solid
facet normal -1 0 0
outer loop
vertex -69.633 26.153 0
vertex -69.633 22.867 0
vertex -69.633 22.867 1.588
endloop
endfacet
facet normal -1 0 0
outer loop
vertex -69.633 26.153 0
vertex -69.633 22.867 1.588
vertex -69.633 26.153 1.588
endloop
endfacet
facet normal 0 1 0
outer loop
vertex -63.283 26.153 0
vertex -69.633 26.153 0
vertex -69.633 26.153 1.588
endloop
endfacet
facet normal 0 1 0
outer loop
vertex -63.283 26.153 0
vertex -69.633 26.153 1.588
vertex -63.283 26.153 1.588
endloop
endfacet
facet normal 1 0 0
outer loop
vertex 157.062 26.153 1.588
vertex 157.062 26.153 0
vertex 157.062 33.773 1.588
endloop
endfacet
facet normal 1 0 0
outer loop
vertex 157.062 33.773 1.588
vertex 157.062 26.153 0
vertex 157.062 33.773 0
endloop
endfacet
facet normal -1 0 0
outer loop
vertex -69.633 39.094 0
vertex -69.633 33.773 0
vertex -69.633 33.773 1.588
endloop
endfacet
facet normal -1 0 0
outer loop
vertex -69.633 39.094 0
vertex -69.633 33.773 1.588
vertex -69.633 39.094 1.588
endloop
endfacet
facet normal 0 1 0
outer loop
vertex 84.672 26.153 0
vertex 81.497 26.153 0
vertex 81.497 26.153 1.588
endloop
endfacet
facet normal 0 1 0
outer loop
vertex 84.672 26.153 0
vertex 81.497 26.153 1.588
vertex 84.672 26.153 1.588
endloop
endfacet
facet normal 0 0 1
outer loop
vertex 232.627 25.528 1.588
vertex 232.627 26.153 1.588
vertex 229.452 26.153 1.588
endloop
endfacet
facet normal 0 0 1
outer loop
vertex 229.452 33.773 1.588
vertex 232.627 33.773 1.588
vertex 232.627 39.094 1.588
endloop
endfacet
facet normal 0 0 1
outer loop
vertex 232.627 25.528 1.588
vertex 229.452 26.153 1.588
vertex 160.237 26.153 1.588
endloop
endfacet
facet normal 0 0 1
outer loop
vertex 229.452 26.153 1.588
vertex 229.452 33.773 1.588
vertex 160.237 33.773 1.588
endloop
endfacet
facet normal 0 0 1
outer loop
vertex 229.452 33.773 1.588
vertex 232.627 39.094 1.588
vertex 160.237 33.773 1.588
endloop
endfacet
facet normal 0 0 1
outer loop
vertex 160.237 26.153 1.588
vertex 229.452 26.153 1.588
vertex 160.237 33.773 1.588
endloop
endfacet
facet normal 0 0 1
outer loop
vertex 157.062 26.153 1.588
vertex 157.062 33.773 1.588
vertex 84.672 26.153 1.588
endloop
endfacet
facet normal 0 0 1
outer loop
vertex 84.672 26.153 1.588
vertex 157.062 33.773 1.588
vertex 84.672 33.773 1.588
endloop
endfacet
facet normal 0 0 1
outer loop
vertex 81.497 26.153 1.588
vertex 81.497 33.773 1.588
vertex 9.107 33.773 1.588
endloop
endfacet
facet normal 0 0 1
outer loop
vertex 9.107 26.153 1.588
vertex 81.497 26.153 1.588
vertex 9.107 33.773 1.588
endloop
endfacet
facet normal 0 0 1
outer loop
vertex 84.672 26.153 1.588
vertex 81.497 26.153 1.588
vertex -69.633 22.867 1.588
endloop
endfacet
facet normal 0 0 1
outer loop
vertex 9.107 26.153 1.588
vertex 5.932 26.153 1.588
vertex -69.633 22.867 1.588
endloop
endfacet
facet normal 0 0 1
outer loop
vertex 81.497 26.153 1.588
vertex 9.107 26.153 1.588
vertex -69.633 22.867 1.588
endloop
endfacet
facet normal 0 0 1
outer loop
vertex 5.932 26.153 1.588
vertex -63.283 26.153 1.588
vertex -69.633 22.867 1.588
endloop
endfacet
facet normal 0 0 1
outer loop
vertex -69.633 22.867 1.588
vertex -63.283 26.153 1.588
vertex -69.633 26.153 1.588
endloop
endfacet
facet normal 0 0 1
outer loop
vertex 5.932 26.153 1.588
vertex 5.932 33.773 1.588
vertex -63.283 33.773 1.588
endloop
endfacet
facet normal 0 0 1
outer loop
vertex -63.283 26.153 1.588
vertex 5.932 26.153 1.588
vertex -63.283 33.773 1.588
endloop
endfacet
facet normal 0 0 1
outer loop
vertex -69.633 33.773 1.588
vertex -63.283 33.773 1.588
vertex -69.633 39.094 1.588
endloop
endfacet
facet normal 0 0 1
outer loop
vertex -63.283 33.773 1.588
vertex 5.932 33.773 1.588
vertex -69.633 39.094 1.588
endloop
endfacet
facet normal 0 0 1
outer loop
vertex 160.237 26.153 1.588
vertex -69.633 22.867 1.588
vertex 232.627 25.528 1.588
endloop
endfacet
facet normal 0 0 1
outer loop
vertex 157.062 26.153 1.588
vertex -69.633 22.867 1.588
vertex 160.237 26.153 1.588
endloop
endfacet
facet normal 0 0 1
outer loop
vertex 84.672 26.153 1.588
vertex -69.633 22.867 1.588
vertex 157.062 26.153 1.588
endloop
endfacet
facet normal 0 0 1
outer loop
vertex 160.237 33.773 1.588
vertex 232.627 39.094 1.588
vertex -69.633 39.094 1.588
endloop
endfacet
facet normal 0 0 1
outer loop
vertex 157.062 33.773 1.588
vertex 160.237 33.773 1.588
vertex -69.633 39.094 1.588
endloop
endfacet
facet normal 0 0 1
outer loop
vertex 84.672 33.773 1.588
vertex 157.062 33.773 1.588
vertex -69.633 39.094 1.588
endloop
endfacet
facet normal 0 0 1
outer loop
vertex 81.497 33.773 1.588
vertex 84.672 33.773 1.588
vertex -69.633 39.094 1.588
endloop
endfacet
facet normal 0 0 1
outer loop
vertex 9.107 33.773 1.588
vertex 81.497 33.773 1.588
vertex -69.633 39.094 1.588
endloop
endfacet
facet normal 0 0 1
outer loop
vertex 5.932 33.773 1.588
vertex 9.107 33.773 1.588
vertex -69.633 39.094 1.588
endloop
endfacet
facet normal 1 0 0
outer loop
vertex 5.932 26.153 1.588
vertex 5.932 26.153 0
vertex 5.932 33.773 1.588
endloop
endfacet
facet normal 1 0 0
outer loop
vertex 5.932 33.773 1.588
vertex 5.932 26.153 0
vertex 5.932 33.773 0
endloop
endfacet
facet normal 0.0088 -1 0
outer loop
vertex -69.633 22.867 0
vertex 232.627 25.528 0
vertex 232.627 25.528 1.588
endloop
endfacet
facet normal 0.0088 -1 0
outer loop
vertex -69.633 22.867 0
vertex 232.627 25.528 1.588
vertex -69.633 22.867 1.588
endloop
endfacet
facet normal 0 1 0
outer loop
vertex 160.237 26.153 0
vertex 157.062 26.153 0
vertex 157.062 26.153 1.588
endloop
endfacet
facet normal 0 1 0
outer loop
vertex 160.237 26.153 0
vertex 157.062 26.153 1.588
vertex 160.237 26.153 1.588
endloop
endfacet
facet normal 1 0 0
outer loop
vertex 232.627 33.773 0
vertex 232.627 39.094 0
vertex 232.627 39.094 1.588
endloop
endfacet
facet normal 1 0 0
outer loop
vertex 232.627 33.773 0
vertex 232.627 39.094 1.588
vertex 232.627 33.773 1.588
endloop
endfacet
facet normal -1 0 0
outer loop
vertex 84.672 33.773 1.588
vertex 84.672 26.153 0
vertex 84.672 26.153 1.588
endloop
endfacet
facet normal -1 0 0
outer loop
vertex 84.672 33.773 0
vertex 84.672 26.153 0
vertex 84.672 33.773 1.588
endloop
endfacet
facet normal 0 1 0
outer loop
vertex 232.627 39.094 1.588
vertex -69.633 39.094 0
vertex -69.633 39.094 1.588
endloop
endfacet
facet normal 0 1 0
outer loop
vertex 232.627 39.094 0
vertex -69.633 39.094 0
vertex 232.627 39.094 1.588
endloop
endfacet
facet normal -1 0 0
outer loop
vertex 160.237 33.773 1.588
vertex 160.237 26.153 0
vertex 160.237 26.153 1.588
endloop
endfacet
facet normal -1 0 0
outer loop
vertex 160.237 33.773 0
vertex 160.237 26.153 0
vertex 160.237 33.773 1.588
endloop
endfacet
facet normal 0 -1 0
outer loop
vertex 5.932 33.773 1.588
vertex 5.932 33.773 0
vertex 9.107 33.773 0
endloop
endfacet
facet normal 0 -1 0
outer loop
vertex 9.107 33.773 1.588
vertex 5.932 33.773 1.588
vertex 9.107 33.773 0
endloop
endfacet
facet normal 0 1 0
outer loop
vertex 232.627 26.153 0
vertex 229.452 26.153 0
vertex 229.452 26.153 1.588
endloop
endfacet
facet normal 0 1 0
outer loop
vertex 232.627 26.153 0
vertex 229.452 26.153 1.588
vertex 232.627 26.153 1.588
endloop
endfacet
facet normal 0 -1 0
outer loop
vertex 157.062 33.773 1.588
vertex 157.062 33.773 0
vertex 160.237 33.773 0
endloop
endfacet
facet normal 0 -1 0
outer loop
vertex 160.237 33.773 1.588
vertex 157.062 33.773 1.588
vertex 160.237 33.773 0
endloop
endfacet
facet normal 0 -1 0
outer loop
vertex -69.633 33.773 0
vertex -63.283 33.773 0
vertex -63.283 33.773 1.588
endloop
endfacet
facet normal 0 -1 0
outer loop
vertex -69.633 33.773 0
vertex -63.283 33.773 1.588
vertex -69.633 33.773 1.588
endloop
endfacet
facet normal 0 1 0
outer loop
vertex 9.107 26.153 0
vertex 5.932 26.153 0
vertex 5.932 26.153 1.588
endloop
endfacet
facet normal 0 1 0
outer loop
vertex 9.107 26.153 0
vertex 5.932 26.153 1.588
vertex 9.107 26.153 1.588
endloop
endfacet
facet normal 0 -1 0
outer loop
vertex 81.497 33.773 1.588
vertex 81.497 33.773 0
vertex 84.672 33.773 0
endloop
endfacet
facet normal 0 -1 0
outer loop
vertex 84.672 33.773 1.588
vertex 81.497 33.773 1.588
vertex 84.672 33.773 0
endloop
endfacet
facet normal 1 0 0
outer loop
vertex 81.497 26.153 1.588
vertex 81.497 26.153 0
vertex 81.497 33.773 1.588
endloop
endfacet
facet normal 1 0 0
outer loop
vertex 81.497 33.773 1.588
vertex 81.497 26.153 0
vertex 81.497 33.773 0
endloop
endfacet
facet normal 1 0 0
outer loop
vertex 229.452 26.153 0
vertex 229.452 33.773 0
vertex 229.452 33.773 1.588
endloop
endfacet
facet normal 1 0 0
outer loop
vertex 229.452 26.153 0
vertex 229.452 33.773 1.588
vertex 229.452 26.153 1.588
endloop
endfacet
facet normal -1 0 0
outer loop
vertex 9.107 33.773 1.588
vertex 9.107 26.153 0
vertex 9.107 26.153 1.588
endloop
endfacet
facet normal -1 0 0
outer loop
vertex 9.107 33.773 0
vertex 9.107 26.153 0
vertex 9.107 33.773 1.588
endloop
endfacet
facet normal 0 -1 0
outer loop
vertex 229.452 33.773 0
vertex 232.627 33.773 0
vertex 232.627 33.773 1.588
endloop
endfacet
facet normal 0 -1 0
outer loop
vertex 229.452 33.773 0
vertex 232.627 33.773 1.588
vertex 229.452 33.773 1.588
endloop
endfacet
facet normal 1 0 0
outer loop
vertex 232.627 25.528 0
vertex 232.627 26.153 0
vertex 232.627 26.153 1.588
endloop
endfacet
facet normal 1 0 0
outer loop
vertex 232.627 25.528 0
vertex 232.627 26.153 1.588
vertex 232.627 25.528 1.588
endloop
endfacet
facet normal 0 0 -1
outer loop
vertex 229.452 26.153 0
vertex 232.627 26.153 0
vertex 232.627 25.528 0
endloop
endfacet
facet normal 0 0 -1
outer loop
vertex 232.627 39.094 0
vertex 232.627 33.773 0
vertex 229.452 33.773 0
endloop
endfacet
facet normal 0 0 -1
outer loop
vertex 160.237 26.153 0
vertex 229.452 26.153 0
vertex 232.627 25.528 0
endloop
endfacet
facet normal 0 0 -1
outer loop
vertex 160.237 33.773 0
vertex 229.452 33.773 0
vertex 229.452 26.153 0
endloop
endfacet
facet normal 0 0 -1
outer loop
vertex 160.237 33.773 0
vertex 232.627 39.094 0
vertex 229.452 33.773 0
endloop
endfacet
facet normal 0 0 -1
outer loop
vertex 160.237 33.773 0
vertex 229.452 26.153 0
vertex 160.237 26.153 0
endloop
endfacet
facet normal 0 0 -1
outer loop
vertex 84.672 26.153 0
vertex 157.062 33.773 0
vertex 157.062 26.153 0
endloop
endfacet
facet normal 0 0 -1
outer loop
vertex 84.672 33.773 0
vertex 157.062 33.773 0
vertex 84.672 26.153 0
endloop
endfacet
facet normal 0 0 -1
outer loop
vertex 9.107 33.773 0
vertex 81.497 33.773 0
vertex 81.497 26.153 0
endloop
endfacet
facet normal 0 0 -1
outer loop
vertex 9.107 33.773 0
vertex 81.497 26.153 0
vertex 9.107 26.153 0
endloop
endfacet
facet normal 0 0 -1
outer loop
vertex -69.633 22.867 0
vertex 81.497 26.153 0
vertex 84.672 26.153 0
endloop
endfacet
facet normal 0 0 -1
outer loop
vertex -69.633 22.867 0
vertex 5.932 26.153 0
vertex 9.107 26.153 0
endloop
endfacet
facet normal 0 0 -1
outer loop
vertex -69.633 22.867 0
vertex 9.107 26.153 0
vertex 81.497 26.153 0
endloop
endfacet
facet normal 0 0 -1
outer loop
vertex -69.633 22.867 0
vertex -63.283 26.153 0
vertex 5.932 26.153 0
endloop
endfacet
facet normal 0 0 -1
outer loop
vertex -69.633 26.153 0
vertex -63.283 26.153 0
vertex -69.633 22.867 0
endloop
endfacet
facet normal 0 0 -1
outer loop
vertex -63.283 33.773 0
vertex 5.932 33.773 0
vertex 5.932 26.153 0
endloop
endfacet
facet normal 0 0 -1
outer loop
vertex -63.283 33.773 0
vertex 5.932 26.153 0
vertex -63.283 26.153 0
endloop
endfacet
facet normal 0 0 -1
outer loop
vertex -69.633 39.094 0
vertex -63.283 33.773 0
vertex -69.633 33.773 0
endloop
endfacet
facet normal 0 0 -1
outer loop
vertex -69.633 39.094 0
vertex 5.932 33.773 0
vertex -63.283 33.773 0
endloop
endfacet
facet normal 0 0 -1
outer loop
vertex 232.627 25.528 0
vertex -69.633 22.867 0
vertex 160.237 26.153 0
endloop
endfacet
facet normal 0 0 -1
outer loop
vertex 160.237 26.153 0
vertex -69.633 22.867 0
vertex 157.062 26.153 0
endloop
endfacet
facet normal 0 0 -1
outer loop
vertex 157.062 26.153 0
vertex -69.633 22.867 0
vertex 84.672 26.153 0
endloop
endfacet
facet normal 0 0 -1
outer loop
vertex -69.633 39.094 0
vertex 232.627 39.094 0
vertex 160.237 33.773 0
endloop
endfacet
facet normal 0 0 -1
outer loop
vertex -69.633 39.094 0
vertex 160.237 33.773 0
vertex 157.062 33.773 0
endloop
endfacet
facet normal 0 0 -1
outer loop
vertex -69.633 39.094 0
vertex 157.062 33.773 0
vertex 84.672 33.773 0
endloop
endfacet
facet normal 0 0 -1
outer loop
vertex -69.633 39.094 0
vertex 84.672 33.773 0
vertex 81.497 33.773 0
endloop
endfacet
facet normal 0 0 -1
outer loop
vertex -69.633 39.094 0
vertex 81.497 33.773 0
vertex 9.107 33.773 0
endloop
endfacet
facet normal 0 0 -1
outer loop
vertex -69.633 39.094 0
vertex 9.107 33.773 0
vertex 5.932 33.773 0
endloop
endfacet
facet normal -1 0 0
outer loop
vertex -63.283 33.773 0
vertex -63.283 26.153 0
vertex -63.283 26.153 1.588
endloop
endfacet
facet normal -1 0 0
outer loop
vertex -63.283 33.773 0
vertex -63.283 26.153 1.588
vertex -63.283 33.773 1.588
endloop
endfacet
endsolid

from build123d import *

# Parameters (mm, degrees)
SKETCH1_W           = 3.175
SKETCH1_H           = 7.62
BOSS_EXTRUDE1_DEPTH = 1.5875


with BuildPart() as part:
    # Sketch1 → Boss-Extrude1 (new body)
    with BuildSketch(Plane.XY):
        Polygon((232.626798958, 25.527772685), (-69.633201042, 22.867122461), (-69.633201042, 26.152979633), (-63.283201042, 26.152979633), (-63.283201042, 33.772979633), (-69.633201042, 33.772979633), (-69.633201042, 39.09426549), (232.626798958, 39.09426549), (232.626798958, 33.772979633), (229.451798958, 33.772979633), (229.451798958, 26.152979633), (232.626798958, 26.152979633), align=None)
        with Locations((158.649298958, 29.962979633)):
            Rectangle(SKETCH1_W, SKETCH1_H, mode=Mode.SUBTRACT)
        with Locations((83.084298958, 29.962979633)):
            Rectangle(SKETCH1_W, SKETCH1_H, mode=Mode.SUBTRACT)
        with Locations((7.519298958, 29.962979633)):
            Rectangle(SKETCH1_W, SKETCH1_H, mode=Mode.SUBTRACT)
    extrude(amount=BOSS_EXTRUDE1_DEPTH)


solid = part.part
